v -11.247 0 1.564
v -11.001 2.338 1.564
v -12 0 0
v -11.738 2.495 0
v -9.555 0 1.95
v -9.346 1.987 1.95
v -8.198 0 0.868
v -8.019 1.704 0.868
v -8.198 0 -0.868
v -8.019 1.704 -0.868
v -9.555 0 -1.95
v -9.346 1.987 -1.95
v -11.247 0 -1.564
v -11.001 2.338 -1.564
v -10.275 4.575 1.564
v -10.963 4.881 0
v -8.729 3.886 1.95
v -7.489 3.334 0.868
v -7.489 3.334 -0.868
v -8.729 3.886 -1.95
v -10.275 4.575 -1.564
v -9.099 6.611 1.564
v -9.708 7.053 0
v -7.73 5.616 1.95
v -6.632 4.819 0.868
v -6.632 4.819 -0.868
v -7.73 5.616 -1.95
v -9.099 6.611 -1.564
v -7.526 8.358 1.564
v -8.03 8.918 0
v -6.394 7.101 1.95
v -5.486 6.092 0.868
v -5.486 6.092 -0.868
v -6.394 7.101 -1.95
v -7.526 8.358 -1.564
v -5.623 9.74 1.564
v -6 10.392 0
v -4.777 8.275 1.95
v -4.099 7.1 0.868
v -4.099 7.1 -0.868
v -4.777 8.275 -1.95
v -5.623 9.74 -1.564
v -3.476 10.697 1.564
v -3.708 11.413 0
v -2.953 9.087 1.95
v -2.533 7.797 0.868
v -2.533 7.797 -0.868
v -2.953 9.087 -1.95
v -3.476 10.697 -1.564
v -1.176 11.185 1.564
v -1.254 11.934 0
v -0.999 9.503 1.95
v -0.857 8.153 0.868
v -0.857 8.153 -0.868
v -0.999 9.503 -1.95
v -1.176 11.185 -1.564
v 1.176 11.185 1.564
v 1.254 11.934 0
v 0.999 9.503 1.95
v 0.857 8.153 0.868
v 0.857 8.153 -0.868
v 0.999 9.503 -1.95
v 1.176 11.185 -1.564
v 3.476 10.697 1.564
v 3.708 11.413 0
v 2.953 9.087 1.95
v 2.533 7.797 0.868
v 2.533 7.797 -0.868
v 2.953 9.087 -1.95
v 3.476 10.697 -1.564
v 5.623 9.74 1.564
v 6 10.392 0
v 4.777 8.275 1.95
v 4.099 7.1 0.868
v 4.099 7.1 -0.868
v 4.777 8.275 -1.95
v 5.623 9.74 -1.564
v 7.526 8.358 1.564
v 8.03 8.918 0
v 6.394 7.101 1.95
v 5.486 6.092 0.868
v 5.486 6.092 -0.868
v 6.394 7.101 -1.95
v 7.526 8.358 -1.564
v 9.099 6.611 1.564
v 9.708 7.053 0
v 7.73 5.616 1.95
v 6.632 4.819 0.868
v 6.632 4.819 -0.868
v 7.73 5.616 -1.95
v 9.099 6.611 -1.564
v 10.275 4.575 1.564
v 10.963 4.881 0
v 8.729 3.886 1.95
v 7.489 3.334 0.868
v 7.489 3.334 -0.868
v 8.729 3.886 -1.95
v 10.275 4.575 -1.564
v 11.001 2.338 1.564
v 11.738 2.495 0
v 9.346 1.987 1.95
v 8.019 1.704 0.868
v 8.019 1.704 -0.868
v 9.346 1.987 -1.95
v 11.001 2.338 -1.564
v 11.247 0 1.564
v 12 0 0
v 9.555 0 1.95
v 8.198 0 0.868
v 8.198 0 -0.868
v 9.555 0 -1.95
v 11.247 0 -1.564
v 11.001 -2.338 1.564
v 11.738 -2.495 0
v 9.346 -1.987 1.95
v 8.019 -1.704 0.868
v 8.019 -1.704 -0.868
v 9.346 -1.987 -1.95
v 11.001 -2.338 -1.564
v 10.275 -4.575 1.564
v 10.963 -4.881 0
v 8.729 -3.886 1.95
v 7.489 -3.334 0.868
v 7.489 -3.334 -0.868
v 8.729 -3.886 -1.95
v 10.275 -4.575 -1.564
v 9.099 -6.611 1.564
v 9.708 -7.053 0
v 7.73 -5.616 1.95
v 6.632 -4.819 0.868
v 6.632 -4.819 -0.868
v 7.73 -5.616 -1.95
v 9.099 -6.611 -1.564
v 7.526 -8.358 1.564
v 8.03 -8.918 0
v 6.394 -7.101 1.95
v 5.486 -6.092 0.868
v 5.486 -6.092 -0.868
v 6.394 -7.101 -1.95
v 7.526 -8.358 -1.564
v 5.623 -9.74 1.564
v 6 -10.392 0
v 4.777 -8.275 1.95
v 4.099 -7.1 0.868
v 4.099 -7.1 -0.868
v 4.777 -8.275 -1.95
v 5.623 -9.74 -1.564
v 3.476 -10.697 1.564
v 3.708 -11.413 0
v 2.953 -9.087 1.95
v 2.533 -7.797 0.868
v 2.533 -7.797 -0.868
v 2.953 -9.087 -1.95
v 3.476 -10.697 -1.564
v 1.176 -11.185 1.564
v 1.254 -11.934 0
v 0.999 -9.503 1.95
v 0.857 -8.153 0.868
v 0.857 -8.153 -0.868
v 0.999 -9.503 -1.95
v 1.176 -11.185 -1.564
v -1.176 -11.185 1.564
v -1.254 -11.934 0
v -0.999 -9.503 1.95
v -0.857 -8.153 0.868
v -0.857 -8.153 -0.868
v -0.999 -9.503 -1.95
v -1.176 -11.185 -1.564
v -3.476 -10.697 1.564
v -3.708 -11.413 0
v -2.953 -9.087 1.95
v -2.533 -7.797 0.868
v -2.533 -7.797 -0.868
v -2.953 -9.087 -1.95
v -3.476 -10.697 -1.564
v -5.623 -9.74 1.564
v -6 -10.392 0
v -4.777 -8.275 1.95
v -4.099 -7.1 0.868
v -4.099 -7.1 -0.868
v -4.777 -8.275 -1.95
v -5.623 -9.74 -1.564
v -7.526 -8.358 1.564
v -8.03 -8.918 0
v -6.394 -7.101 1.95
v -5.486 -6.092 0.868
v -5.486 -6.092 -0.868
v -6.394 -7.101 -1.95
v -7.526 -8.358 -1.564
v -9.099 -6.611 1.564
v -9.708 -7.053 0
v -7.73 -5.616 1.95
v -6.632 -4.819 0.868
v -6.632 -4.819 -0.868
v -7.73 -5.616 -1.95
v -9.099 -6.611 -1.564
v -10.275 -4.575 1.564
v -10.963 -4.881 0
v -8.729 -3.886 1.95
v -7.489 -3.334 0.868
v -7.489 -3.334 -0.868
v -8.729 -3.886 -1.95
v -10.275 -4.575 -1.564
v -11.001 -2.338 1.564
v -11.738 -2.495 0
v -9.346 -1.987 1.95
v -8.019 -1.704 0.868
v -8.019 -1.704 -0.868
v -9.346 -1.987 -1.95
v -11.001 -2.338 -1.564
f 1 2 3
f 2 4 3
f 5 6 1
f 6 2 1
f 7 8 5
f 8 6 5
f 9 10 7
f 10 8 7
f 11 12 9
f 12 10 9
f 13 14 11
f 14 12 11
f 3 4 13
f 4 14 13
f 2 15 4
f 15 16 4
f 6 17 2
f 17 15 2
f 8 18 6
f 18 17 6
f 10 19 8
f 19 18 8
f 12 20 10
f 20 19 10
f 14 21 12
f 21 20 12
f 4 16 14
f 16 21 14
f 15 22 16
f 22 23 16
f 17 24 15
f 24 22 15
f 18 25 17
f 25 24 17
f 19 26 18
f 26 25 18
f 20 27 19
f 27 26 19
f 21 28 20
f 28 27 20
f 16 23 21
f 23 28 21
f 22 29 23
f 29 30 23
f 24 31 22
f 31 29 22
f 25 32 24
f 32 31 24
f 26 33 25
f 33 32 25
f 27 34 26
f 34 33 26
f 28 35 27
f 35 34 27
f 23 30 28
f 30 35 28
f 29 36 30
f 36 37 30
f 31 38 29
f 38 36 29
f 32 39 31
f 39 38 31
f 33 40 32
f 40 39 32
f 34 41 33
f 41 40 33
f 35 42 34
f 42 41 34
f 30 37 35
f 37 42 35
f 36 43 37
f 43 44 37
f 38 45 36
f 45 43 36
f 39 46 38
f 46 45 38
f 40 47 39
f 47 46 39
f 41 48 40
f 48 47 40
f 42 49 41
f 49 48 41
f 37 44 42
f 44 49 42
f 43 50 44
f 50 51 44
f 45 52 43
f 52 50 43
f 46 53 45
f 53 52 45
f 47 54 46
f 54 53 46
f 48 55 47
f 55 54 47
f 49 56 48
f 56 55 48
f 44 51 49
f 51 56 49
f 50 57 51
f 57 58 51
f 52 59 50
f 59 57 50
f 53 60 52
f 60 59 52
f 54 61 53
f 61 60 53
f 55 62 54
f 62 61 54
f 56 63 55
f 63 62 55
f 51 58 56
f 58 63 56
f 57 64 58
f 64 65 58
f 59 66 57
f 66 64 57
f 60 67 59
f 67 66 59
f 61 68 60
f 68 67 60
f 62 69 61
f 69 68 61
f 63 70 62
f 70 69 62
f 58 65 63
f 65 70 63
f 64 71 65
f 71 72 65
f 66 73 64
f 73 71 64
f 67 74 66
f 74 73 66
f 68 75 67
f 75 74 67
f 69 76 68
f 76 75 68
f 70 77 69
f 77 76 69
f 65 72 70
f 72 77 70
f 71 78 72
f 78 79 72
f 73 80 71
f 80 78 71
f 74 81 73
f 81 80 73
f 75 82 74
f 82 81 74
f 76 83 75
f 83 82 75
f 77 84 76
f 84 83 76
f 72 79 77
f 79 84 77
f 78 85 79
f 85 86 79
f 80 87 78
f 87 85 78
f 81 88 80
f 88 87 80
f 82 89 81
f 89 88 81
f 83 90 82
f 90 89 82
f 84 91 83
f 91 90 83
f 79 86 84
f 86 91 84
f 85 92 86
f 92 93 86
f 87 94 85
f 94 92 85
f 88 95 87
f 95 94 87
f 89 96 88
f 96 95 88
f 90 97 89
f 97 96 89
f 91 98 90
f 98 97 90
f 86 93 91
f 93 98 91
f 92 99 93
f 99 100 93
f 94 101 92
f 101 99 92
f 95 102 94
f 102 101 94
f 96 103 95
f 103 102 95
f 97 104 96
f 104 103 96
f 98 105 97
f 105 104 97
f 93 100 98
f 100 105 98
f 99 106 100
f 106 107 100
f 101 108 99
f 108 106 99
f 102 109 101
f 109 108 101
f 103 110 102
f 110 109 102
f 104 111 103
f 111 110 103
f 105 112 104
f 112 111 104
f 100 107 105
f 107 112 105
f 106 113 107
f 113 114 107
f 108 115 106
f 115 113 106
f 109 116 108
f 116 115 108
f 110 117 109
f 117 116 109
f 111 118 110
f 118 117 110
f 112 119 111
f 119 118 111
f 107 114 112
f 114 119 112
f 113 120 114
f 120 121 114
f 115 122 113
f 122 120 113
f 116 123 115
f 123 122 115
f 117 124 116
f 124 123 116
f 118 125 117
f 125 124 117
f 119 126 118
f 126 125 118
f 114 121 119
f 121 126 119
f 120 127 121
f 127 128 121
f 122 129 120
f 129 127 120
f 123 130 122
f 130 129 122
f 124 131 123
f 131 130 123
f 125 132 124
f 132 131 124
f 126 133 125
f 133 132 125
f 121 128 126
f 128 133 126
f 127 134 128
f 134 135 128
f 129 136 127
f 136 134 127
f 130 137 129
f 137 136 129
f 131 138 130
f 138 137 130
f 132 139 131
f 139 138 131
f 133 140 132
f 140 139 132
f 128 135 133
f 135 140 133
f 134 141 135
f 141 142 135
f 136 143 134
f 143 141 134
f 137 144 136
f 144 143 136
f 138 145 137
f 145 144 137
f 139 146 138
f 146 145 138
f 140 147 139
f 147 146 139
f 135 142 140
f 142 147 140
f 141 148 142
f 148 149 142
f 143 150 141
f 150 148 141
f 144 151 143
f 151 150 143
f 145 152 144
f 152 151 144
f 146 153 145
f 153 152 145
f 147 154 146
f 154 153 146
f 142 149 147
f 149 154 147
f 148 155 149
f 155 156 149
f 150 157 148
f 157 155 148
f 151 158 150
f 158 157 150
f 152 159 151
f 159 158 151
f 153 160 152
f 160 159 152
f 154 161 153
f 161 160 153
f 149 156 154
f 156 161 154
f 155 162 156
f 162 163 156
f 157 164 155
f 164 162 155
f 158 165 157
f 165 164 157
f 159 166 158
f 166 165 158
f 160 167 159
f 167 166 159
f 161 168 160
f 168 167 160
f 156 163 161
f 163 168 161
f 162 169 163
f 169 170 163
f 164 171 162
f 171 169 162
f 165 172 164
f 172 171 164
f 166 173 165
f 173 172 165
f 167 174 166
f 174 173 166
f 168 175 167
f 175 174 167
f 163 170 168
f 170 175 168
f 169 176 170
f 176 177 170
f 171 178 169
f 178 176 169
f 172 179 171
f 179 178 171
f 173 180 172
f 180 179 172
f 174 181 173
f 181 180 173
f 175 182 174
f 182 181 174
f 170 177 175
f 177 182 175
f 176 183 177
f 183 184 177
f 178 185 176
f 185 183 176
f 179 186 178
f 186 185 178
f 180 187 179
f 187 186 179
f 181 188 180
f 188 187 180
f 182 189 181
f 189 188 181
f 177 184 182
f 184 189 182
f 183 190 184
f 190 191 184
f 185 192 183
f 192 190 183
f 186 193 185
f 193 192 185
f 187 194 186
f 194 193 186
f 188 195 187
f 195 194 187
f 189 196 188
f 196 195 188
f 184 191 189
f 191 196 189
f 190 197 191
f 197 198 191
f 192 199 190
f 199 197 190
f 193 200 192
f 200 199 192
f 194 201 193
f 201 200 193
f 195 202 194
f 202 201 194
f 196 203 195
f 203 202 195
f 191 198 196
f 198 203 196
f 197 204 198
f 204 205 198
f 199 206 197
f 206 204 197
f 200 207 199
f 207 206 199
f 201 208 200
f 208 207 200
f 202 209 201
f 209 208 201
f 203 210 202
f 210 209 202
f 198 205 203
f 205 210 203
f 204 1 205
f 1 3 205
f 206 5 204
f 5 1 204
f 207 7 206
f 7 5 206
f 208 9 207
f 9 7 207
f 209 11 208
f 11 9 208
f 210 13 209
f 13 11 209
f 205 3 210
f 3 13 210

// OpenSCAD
// rotate_extrude a circle offset from the axis -> torus (exact).
rotate_extrude() translate([10, 0]) circle(2);
